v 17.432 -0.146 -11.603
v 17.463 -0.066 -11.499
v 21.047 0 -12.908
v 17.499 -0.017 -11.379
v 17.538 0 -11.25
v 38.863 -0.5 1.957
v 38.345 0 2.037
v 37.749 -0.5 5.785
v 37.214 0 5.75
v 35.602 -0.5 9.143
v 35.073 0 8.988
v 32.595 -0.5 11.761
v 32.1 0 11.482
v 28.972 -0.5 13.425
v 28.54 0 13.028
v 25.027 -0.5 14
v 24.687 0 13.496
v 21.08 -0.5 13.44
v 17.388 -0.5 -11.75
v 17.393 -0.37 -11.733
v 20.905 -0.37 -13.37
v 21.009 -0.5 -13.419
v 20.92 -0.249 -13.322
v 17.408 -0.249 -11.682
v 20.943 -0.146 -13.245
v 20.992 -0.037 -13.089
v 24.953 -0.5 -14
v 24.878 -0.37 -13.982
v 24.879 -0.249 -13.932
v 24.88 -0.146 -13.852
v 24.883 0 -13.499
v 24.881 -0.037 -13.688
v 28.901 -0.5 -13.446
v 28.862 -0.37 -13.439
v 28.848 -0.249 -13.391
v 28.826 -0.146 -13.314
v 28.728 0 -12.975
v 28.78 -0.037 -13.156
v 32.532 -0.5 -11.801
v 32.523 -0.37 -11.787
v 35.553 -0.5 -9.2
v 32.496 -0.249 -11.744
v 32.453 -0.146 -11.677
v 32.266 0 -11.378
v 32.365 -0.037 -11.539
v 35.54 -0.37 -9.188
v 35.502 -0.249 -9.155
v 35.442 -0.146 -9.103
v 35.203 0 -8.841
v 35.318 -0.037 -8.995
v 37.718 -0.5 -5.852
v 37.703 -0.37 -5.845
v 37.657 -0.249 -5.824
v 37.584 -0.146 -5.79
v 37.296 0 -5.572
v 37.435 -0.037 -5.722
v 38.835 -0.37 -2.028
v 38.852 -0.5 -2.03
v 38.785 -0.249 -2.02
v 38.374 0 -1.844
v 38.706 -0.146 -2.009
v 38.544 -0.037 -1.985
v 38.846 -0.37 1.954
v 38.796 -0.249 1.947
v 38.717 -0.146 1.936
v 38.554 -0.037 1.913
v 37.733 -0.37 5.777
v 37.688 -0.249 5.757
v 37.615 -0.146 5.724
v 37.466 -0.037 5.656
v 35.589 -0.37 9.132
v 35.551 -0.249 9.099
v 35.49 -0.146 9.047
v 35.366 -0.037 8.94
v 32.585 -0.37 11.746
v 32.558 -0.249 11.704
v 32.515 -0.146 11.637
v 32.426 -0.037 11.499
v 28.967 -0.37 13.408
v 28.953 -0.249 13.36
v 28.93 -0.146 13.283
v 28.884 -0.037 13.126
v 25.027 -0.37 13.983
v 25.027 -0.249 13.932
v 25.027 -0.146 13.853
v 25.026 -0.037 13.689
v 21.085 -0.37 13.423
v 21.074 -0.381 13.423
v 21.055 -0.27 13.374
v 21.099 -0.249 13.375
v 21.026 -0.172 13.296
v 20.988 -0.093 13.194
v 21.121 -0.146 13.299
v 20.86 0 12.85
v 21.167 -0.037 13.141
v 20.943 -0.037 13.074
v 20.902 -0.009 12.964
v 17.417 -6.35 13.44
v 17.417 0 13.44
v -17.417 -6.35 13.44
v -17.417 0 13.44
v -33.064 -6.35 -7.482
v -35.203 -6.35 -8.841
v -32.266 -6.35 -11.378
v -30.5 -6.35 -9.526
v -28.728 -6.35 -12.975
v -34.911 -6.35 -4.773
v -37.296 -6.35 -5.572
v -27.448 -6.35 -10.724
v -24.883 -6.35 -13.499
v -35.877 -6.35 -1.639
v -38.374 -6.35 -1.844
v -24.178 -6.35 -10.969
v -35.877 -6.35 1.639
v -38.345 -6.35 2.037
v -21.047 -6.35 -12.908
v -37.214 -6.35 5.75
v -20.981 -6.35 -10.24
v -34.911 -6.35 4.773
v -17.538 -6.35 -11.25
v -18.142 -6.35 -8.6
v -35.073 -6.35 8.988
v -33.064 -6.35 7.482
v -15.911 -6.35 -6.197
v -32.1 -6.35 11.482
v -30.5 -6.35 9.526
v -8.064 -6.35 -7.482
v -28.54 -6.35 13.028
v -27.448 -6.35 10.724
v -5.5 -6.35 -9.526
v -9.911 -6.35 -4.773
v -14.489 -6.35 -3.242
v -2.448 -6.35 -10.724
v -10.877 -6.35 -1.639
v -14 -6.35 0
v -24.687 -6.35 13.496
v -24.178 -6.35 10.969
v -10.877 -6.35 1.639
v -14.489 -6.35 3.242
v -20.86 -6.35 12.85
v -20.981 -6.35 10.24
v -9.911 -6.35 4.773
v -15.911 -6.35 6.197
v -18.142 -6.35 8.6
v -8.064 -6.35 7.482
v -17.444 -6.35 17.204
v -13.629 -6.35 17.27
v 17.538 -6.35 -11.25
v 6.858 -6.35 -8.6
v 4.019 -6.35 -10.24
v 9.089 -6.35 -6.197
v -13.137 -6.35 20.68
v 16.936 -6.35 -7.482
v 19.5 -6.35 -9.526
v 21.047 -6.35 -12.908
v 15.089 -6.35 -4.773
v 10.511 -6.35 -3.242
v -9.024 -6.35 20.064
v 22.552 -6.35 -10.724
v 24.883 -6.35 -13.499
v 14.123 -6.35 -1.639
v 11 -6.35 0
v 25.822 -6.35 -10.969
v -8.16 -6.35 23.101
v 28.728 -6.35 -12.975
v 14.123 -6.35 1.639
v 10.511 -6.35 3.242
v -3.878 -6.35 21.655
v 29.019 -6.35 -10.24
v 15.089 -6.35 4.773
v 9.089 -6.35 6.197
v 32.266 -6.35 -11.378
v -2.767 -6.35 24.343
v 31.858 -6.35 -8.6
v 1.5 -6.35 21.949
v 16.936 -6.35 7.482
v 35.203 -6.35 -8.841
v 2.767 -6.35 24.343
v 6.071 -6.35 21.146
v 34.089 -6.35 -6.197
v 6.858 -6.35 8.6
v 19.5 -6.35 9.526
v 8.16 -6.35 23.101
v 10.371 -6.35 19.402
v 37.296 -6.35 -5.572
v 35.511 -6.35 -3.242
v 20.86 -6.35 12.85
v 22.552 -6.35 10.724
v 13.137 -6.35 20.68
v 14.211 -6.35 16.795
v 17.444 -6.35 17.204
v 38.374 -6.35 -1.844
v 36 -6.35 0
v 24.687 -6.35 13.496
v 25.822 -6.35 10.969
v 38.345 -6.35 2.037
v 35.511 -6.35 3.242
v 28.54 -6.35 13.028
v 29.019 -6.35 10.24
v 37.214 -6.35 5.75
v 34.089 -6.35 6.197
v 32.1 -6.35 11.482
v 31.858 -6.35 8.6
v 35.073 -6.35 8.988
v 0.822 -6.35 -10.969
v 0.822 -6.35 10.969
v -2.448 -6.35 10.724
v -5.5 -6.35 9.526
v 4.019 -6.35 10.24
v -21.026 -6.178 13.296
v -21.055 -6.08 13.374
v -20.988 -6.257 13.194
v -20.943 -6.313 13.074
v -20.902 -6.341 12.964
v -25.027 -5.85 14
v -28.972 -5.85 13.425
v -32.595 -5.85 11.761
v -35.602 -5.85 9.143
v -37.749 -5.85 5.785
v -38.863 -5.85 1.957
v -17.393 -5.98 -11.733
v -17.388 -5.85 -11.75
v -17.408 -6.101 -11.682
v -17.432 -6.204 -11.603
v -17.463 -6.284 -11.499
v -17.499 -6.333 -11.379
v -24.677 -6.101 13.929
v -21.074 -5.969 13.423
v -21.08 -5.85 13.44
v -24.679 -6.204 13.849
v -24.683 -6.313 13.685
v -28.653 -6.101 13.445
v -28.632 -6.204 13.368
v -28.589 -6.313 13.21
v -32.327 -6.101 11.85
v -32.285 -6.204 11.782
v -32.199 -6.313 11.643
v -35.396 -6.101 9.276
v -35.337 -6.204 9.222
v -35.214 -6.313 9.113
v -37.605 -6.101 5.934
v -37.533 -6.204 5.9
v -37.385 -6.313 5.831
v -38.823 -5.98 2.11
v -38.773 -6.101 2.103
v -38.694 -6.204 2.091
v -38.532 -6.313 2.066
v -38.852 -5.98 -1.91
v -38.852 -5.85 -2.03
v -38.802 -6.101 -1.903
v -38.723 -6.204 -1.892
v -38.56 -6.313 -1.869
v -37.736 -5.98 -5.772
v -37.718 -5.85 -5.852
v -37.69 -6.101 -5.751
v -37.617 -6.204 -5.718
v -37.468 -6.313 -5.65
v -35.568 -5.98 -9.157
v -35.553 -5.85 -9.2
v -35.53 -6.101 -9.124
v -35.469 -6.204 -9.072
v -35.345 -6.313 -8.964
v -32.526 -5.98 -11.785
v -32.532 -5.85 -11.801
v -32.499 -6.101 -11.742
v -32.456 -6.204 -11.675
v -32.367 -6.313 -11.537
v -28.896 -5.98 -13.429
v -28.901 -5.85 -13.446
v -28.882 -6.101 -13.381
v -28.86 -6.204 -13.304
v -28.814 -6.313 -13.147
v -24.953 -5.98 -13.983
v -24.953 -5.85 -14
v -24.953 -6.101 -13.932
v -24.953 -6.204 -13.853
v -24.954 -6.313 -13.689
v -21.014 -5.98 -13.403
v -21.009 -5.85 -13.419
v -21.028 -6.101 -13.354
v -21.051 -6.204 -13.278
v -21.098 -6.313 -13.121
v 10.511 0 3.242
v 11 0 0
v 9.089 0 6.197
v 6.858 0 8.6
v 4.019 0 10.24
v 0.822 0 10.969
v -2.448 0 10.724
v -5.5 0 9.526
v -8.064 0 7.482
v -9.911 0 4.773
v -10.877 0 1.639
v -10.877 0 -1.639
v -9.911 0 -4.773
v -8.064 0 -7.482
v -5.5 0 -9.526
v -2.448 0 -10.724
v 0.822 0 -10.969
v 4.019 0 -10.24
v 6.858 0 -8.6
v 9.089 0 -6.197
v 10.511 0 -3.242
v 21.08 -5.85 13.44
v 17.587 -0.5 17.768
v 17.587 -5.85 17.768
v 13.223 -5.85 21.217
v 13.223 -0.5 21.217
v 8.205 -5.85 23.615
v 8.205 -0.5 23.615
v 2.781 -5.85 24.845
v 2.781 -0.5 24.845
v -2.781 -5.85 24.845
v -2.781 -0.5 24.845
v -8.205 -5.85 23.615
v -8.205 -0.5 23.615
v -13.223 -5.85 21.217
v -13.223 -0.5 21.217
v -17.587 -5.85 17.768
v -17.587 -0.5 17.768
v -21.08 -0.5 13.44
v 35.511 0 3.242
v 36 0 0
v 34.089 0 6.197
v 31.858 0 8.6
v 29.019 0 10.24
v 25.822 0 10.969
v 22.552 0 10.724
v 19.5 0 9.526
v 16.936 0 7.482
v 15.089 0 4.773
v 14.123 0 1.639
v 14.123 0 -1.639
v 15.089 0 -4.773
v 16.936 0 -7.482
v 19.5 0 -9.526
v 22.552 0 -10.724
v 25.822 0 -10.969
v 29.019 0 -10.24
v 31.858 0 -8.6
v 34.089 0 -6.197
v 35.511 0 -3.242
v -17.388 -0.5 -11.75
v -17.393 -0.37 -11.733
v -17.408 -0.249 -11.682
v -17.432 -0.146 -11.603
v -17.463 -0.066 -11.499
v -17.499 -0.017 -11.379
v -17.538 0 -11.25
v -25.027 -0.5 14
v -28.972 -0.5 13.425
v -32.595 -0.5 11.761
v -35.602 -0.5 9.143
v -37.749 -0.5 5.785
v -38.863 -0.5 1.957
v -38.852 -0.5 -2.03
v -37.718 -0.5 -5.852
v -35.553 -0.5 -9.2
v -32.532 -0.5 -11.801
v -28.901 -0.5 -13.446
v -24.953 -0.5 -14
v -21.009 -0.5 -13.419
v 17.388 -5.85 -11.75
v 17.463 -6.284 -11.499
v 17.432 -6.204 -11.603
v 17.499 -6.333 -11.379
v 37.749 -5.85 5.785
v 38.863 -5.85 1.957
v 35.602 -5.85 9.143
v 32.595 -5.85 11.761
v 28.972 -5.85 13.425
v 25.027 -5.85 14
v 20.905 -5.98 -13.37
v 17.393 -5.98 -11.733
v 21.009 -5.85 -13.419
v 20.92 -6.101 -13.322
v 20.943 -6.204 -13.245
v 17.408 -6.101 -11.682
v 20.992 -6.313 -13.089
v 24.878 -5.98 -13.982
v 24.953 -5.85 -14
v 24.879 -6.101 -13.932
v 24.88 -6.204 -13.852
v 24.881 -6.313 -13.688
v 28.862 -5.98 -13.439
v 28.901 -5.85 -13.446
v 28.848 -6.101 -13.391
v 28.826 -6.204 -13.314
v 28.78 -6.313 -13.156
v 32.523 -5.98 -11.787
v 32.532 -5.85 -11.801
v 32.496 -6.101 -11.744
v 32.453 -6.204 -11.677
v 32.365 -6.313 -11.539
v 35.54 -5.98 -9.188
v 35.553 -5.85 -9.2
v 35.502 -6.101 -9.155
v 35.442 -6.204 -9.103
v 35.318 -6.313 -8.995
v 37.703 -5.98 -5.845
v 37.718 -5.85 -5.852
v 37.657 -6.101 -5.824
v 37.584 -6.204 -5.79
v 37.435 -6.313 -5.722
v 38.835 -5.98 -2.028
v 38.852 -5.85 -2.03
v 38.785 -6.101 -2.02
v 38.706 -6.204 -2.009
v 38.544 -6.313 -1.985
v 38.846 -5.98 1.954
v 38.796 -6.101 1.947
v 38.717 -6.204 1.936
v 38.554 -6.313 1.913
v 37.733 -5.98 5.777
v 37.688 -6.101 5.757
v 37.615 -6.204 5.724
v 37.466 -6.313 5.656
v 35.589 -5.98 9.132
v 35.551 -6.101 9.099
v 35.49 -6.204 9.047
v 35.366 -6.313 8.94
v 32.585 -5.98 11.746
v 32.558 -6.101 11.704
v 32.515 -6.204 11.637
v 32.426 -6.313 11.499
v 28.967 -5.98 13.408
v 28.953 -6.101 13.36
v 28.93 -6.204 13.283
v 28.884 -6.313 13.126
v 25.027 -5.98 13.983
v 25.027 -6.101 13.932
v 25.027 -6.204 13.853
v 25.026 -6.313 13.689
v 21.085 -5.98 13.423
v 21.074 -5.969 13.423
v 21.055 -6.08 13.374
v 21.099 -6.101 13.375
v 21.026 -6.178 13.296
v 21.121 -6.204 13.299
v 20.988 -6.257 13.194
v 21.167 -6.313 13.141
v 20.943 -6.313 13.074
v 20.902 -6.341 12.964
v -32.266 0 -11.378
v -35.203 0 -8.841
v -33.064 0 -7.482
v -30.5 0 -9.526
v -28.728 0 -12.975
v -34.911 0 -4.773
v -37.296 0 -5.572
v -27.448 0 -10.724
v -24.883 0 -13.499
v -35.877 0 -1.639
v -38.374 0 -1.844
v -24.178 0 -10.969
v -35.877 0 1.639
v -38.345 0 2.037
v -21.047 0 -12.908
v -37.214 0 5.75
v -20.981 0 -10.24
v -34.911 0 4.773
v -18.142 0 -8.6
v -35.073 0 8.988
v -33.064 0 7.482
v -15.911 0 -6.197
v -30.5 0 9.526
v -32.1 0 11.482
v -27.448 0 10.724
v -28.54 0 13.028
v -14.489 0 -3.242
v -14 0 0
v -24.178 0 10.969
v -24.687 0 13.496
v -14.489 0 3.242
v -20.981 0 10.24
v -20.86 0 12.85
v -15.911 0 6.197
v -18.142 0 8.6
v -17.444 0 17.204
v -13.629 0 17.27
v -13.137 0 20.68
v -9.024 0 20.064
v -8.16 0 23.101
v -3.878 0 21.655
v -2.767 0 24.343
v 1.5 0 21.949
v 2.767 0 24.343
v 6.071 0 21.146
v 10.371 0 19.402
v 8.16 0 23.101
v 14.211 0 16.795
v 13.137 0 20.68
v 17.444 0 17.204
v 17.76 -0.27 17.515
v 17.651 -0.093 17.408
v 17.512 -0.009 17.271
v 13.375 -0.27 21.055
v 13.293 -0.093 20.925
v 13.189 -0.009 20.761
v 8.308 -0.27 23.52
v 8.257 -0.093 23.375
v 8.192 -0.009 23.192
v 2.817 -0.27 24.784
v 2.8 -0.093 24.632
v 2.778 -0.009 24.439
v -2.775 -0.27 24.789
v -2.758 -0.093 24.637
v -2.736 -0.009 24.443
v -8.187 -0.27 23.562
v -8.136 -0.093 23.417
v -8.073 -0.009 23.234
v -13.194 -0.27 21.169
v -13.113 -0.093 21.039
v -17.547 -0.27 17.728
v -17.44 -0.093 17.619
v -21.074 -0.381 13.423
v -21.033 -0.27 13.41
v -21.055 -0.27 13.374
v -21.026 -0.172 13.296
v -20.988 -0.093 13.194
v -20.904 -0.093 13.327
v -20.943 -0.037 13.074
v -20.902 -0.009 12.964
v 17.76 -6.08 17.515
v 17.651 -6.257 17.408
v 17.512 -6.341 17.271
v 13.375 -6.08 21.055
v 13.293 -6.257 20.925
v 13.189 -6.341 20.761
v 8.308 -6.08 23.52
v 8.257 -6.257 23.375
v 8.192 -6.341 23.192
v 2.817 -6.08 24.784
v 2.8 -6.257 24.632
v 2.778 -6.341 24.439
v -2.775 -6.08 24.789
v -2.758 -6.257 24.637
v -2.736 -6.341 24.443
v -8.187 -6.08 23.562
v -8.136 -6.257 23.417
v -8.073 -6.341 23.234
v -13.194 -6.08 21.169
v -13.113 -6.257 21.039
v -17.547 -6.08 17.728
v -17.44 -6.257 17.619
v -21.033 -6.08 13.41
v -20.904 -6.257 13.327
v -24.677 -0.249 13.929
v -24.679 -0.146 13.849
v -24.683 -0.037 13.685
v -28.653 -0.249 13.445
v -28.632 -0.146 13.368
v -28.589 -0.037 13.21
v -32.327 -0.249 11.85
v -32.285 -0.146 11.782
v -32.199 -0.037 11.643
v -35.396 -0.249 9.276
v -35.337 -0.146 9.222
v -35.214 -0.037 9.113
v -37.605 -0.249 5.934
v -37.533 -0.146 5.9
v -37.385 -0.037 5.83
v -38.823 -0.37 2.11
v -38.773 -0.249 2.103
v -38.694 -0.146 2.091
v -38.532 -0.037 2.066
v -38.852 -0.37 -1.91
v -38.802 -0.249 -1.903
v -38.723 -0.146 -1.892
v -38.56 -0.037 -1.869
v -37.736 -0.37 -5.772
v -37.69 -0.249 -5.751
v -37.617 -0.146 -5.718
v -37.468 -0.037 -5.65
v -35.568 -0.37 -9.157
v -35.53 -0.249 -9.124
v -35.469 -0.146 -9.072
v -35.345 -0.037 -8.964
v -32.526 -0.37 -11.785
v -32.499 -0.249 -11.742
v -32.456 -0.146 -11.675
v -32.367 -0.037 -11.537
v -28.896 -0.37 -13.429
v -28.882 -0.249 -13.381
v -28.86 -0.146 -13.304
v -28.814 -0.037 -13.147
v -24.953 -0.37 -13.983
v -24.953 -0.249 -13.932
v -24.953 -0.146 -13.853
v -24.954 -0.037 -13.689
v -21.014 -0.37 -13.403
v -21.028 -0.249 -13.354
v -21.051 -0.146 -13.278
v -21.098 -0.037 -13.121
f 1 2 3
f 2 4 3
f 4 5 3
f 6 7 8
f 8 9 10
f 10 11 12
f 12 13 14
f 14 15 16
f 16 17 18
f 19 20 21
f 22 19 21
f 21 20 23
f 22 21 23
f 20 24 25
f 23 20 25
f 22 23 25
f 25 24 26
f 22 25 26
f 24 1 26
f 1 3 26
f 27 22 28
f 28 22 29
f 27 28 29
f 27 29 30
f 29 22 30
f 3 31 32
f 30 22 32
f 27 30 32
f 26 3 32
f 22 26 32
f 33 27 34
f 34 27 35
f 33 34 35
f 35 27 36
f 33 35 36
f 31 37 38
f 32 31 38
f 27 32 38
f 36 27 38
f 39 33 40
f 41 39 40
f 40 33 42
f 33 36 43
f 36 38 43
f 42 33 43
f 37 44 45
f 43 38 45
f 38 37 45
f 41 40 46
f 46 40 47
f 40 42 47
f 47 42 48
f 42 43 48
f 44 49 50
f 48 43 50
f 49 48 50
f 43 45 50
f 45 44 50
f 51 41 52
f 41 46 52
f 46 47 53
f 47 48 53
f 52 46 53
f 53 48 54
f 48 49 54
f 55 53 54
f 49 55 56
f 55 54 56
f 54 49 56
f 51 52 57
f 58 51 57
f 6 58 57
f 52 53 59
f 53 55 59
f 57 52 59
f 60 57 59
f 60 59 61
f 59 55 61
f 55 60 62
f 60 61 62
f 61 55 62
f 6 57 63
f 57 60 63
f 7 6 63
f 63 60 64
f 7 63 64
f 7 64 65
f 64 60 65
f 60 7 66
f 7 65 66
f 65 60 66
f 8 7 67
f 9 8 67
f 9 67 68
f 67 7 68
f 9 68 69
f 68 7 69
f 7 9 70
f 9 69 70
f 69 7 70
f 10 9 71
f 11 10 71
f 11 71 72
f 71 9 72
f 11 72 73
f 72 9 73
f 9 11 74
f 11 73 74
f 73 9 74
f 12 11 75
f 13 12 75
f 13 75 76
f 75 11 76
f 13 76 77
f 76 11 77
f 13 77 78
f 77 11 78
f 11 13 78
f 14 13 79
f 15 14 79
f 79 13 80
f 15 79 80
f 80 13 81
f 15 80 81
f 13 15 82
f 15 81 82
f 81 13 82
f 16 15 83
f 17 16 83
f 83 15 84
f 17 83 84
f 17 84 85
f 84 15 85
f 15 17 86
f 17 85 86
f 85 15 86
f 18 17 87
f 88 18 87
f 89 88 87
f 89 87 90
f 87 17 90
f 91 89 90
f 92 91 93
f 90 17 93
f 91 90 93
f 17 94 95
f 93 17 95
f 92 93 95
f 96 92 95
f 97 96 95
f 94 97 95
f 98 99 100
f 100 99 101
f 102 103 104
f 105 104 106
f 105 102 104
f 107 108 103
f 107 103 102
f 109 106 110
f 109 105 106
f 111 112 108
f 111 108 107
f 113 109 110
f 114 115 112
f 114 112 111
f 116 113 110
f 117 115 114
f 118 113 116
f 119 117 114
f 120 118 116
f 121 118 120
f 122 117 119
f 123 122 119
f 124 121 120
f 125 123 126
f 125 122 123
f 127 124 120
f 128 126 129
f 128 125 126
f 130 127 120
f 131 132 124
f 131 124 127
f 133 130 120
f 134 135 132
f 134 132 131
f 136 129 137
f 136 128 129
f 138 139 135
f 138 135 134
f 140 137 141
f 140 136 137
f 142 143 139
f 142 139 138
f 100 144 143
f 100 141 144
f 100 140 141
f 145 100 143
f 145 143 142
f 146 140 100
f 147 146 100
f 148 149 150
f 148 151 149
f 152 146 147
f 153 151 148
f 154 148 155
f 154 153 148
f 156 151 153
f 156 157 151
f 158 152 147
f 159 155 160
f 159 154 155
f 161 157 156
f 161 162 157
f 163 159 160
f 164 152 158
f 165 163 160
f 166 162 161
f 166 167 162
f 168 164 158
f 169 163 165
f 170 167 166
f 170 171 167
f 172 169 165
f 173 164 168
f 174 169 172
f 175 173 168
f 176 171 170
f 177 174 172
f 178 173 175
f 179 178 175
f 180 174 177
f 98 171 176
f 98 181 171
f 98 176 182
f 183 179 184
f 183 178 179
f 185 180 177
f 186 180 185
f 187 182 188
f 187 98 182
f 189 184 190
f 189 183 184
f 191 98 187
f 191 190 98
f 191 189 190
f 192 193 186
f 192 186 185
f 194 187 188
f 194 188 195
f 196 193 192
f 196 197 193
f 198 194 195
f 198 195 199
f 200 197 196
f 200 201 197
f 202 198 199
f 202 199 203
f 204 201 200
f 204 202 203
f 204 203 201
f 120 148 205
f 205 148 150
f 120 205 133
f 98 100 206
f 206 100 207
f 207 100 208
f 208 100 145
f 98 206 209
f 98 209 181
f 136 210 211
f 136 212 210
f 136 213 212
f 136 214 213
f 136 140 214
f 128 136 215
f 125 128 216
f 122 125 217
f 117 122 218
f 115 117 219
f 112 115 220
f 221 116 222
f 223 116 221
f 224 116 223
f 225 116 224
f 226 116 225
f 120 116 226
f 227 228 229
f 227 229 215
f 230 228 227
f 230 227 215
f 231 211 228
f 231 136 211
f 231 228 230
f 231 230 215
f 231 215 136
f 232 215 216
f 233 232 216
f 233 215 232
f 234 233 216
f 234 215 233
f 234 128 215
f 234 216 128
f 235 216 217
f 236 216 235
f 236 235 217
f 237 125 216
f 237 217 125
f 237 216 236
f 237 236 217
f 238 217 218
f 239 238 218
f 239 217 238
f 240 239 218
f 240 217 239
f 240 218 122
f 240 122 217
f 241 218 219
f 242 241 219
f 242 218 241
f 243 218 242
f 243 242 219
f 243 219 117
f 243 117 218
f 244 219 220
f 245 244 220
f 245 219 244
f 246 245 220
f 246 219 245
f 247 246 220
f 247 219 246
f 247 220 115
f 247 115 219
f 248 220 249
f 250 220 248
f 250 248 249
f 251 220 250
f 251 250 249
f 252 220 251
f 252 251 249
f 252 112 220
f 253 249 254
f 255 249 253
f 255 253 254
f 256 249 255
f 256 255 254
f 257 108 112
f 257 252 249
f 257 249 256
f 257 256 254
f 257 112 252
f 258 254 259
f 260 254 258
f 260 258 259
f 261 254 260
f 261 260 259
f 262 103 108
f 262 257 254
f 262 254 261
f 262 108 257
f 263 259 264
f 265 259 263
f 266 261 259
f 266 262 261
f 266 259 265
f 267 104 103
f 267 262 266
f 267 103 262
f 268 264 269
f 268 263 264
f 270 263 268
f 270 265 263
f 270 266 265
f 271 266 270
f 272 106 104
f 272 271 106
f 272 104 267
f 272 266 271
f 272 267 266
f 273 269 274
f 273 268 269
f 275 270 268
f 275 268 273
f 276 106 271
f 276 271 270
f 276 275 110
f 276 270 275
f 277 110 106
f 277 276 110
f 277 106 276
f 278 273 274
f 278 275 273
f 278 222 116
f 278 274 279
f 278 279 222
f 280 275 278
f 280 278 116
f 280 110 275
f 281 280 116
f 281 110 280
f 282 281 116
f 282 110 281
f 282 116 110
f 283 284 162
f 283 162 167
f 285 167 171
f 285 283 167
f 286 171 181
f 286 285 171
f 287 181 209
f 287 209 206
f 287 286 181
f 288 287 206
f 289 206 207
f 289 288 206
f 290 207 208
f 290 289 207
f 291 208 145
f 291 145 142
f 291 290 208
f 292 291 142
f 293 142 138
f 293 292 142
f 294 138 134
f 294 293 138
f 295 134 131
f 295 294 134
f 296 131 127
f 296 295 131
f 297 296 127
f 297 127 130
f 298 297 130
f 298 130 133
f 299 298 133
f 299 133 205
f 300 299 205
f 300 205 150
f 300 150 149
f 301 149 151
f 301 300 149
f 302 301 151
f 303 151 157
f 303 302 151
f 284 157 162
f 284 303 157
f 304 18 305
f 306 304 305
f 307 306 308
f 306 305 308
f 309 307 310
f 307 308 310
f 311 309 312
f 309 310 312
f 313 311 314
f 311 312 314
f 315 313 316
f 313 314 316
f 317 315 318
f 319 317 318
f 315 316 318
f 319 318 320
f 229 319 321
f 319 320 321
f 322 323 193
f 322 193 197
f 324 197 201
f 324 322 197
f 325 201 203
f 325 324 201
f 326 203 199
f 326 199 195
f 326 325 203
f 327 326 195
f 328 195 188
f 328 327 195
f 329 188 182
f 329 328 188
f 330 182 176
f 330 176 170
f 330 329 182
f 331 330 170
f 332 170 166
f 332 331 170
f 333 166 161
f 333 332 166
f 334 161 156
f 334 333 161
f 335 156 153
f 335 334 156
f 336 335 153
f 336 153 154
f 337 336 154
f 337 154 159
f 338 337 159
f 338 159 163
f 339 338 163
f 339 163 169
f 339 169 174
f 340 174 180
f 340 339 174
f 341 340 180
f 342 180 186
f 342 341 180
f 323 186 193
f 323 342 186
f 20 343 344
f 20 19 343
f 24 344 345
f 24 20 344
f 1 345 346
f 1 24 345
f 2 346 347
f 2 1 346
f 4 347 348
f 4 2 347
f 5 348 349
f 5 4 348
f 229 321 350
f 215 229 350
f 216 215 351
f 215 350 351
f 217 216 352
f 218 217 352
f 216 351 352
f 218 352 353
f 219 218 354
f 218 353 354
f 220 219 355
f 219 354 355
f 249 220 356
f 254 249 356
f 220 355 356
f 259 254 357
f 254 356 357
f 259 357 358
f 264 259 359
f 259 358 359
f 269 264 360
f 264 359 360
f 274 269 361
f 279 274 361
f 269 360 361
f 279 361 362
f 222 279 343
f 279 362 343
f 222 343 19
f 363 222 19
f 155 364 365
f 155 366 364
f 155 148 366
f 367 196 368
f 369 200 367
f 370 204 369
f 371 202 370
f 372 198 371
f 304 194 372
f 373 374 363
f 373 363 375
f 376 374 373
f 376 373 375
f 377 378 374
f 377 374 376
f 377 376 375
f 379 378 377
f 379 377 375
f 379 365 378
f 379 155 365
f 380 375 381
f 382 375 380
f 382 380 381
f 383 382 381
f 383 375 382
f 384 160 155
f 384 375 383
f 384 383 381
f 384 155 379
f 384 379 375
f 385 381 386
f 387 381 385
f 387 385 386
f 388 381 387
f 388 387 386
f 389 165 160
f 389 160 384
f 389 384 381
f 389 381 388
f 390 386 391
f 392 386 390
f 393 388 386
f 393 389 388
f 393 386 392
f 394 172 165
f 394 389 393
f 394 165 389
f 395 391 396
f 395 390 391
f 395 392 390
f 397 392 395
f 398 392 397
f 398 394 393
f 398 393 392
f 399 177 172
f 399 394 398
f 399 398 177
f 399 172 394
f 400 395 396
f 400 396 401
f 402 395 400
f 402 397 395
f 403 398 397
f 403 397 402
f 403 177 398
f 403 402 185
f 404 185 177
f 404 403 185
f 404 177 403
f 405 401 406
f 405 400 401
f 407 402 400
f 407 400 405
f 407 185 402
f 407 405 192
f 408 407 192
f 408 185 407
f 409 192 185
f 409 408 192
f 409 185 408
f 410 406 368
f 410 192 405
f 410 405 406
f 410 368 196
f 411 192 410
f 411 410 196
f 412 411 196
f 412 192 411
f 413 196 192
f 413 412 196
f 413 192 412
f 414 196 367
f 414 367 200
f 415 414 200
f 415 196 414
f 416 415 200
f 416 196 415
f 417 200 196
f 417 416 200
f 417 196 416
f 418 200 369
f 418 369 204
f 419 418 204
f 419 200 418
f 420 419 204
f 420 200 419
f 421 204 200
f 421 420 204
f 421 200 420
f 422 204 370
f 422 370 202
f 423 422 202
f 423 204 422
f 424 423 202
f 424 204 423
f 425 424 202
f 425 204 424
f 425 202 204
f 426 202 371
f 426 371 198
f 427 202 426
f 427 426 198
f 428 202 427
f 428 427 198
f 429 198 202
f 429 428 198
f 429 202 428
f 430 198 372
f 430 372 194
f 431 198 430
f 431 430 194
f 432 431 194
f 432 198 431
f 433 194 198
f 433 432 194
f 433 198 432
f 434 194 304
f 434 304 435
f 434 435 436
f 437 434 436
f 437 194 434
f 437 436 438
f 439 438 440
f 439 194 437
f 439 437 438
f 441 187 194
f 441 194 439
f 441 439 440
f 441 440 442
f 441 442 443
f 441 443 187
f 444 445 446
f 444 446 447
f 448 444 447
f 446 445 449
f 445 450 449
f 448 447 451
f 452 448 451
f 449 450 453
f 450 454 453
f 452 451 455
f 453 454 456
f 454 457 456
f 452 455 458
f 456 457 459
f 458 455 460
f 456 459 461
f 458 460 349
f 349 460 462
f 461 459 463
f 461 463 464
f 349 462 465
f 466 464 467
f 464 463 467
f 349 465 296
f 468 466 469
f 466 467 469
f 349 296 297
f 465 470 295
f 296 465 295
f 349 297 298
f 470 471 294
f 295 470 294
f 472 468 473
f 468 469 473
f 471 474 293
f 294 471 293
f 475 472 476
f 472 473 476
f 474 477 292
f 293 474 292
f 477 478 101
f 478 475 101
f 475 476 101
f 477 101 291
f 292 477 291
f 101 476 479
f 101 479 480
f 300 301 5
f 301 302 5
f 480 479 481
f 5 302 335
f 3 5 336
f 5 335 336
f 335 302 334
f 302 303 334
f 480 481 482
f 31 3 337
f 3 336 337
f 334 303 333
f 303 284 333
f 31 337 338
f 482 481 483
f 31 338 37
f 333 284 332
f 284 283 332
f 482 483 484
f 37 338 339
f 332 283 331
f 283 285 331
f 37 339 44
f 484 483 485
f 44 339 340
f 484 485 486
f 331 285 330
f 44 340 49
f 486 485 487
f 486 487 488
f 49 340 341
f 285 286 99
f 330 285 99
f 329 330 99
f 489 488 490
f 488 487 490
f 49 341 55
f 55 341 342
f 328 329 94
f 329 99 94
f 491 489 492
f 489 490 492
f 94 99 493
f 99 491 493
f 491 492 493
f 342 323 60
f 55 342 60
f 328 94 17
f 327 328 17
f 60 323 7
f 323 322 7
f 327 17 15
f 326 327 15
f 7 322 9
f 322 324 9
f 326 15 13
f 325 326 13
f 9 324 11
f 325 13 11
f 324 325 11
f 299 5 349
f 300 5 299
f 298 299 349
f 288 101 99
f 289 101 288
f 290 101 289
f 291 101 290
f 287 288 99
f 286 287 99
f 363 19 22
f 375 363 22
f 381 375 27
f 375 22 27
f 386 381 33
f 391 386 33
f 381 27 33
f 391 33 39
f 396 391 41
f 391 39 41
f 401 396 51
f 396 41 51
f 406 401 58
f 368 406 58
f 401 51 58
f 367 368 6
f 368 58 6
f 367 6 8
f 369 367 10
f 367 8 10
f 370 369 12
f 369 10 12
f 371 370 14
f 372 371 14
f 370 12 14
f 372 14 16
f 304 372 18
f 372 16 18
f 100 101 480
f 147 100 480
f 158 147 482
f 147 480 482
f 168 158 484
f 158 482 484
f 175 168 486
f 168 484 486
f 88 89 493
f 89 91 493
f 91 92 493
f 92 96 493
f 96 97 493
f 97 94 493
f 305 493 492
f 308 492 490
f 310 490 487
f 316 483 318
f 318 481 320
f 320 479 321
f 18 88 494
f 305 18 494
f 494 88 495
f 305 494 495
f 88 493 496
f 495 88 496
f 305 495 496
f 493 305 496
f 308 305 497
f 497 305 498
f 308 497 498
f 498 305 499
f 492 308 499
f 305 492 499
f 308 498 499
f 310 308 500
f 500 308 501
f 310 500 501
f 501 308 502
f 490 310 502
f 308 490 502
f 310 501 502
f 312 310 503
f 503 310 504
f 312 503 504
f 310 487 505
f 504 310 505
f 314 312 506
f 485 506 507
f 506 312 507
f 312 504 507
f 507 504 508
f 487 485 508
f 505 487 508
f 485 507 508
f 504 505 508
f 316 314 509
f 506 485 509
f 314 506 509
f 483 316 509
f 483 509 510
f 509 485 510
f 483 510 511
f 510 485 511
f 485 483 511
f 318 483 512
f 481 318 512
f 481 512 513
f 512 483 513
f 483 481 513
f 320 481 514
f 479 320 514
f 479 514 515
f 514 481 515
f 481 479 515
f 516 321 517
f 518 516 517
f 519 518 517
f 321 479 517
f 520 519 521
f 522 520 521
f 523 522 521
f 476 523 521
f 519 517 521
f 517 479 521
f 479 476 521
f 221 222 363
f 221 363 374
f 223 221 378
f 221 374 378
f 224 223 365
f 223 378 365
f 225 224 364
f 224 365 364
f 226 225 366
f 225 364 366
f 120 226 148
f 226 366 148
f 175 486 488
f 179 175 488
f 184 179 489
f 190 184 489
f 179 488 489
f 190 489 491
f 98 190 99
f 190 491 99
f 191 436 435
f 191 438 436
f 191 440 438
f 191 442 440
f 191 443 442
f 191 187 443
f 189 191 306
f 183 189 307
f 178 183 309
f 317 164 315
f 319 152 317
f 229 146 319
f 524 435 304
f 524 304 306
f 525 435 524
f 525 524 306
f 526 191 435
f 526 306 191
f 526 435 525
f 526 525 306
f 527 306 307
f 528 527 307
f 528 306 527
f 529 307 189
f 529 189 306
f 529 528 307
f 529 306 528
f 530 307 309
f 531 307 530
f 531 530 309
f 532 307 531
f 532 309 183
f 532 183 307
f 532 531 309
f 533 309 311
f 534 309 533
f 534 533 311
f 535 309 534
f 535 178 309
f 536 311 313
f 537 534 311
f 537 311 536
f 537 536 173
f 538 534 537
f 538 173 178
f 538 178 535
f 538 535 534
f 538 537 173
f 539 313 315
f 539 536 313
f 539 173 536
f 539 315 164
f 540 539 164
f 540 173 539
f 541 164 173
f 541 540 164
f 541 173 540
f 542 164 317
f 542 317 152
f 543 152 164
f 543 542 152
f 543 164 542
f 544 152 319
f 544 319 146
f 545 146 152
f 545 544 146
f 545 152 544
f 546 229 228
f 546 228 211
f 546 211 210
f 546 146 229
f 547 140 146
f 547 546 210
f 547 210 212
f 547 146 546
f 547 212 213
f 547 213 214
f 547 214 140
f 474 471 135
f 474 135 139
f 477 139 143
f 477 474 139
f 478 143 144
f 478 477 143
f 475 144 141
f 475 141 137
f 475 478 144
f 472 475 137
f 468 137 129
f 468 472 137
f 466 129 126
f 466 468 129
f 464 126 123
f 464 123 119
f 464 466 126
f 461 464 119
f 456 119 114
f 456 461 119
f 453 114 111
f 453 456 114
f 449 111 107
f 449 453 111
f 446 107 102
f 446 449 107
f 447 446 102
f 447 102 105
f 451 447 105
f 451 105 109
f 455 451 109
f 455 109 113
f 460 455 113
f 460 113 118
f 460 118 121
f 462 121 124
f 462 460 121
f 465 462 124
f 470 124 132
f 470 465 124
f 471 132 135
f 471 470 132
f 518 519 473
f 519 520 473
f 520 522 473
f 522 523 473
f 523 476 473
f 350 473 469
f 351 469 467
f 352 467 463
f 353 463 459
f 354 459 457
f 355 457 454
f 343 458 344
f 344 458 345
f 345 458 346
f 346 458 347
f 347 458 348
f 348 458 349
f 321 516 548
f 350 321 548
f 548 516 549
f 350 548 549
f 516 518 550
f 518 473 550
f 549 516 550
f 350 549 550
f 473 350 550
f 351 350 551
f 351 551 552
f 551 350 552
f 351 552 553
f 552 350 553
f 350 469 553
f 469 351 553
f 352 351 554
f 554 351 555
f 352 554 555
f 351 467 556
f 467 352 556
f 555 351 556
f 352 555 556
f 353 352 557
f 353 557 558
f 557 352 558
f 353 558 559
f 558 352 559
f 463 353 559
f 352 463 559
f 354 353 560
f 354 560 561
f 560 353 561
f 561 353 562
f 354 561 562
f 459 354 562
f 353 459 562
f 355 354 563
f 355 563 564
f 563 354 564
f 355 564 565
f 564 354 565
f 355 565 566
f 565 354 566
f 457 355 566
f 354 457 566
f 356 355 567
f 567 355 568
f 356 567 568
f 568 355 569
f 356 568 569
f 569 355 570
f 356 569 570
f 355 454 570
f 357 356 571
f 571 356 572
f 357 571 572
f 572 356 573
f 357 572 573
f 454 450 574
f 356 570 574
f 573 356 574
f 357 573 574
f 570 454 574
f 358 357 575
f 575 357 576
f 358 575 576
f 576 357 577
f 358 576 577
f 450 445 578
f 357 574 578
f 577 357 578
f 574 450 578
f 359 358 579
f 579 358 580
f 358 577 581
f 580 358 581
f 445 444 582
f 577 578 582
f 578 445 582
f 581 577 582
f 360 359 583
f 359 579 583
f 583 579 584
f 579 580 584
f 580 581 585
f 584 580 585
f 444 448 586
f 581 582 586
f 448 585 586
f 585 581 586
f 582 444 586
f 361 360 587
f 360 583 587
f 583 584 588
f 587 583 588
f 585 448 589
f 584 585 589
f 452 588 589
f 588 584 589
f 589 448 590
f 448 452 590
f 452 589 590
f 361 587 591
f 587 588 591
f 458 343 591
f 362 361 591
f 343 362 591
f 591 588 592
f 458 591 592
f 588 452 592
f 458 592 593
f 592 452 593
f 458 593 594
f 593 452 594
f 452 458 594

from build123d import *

# Parameters (mm, degrees)
F0_R     = 11
F1_DEPTH = 6.35
F2_R     = 0.5


with BuildPart() as f1:
    # F0 (on Front) → F1 (new body)
    with BuildSketch(Plane.XZ):
        with BuildLine():
            ThreePointArc((21.08, 13.44), (0, 25), (-21.08, 13.44))
            ThreePointArc((-21.08, 13.44), (-38.852036, -2.030049), (-17.388343, -11.750008))
            Line((-17.388343, -11.750008), (17.388343, -11.750008))
            ThreePointArc((17.388343, -11.750008), (38.852036, -2.030049), (21.08, 13.44))
        make_face()
        with Locations((-25, 0)):
            Circle(F0_R, mode=Mode.SUBTRACT)
        Circle(F0_R, mode=Mode.SUBTRACT)
        with Locations((25, 0)):
            Circle(F0_R, mode=Mode.SUBTRACT)
        with BuildLine():
            ThreePointArc((1.5, 21.948804), (10.371456, 19.401879), (17.417417, 13.44))
            Line((17.417417, 13.44), (1.5, 13.44))
            Line((1.5, 13.44), (-17.417417, 13.44))
            ThreePointArc((-17.417417, 13.44), (-9.024465, 20.063874), (1.5, 21.948804))
        make_face(mode=Mode.SUBTRACT)
    extrude(amount=F1_DEPTH)

    # F2
    f2_edges = [f1.edges().sort_by_distance(p)[0] for p in [
        (-38.852036, -6.35, -2.030049),
        (0, -6.35, 25),
        (38.852036, -6.35, -2.030049),
        (0, -6.35, -11.750008),
        (38.852036, 0, -2.030049),
        (0, 0, 25),
        (-38.852036, 0, -2.030049),
        (0, 0, -11.750008),
    ]]
    fillet(f2_edges, radius=F2_R)


solid = f1.part
